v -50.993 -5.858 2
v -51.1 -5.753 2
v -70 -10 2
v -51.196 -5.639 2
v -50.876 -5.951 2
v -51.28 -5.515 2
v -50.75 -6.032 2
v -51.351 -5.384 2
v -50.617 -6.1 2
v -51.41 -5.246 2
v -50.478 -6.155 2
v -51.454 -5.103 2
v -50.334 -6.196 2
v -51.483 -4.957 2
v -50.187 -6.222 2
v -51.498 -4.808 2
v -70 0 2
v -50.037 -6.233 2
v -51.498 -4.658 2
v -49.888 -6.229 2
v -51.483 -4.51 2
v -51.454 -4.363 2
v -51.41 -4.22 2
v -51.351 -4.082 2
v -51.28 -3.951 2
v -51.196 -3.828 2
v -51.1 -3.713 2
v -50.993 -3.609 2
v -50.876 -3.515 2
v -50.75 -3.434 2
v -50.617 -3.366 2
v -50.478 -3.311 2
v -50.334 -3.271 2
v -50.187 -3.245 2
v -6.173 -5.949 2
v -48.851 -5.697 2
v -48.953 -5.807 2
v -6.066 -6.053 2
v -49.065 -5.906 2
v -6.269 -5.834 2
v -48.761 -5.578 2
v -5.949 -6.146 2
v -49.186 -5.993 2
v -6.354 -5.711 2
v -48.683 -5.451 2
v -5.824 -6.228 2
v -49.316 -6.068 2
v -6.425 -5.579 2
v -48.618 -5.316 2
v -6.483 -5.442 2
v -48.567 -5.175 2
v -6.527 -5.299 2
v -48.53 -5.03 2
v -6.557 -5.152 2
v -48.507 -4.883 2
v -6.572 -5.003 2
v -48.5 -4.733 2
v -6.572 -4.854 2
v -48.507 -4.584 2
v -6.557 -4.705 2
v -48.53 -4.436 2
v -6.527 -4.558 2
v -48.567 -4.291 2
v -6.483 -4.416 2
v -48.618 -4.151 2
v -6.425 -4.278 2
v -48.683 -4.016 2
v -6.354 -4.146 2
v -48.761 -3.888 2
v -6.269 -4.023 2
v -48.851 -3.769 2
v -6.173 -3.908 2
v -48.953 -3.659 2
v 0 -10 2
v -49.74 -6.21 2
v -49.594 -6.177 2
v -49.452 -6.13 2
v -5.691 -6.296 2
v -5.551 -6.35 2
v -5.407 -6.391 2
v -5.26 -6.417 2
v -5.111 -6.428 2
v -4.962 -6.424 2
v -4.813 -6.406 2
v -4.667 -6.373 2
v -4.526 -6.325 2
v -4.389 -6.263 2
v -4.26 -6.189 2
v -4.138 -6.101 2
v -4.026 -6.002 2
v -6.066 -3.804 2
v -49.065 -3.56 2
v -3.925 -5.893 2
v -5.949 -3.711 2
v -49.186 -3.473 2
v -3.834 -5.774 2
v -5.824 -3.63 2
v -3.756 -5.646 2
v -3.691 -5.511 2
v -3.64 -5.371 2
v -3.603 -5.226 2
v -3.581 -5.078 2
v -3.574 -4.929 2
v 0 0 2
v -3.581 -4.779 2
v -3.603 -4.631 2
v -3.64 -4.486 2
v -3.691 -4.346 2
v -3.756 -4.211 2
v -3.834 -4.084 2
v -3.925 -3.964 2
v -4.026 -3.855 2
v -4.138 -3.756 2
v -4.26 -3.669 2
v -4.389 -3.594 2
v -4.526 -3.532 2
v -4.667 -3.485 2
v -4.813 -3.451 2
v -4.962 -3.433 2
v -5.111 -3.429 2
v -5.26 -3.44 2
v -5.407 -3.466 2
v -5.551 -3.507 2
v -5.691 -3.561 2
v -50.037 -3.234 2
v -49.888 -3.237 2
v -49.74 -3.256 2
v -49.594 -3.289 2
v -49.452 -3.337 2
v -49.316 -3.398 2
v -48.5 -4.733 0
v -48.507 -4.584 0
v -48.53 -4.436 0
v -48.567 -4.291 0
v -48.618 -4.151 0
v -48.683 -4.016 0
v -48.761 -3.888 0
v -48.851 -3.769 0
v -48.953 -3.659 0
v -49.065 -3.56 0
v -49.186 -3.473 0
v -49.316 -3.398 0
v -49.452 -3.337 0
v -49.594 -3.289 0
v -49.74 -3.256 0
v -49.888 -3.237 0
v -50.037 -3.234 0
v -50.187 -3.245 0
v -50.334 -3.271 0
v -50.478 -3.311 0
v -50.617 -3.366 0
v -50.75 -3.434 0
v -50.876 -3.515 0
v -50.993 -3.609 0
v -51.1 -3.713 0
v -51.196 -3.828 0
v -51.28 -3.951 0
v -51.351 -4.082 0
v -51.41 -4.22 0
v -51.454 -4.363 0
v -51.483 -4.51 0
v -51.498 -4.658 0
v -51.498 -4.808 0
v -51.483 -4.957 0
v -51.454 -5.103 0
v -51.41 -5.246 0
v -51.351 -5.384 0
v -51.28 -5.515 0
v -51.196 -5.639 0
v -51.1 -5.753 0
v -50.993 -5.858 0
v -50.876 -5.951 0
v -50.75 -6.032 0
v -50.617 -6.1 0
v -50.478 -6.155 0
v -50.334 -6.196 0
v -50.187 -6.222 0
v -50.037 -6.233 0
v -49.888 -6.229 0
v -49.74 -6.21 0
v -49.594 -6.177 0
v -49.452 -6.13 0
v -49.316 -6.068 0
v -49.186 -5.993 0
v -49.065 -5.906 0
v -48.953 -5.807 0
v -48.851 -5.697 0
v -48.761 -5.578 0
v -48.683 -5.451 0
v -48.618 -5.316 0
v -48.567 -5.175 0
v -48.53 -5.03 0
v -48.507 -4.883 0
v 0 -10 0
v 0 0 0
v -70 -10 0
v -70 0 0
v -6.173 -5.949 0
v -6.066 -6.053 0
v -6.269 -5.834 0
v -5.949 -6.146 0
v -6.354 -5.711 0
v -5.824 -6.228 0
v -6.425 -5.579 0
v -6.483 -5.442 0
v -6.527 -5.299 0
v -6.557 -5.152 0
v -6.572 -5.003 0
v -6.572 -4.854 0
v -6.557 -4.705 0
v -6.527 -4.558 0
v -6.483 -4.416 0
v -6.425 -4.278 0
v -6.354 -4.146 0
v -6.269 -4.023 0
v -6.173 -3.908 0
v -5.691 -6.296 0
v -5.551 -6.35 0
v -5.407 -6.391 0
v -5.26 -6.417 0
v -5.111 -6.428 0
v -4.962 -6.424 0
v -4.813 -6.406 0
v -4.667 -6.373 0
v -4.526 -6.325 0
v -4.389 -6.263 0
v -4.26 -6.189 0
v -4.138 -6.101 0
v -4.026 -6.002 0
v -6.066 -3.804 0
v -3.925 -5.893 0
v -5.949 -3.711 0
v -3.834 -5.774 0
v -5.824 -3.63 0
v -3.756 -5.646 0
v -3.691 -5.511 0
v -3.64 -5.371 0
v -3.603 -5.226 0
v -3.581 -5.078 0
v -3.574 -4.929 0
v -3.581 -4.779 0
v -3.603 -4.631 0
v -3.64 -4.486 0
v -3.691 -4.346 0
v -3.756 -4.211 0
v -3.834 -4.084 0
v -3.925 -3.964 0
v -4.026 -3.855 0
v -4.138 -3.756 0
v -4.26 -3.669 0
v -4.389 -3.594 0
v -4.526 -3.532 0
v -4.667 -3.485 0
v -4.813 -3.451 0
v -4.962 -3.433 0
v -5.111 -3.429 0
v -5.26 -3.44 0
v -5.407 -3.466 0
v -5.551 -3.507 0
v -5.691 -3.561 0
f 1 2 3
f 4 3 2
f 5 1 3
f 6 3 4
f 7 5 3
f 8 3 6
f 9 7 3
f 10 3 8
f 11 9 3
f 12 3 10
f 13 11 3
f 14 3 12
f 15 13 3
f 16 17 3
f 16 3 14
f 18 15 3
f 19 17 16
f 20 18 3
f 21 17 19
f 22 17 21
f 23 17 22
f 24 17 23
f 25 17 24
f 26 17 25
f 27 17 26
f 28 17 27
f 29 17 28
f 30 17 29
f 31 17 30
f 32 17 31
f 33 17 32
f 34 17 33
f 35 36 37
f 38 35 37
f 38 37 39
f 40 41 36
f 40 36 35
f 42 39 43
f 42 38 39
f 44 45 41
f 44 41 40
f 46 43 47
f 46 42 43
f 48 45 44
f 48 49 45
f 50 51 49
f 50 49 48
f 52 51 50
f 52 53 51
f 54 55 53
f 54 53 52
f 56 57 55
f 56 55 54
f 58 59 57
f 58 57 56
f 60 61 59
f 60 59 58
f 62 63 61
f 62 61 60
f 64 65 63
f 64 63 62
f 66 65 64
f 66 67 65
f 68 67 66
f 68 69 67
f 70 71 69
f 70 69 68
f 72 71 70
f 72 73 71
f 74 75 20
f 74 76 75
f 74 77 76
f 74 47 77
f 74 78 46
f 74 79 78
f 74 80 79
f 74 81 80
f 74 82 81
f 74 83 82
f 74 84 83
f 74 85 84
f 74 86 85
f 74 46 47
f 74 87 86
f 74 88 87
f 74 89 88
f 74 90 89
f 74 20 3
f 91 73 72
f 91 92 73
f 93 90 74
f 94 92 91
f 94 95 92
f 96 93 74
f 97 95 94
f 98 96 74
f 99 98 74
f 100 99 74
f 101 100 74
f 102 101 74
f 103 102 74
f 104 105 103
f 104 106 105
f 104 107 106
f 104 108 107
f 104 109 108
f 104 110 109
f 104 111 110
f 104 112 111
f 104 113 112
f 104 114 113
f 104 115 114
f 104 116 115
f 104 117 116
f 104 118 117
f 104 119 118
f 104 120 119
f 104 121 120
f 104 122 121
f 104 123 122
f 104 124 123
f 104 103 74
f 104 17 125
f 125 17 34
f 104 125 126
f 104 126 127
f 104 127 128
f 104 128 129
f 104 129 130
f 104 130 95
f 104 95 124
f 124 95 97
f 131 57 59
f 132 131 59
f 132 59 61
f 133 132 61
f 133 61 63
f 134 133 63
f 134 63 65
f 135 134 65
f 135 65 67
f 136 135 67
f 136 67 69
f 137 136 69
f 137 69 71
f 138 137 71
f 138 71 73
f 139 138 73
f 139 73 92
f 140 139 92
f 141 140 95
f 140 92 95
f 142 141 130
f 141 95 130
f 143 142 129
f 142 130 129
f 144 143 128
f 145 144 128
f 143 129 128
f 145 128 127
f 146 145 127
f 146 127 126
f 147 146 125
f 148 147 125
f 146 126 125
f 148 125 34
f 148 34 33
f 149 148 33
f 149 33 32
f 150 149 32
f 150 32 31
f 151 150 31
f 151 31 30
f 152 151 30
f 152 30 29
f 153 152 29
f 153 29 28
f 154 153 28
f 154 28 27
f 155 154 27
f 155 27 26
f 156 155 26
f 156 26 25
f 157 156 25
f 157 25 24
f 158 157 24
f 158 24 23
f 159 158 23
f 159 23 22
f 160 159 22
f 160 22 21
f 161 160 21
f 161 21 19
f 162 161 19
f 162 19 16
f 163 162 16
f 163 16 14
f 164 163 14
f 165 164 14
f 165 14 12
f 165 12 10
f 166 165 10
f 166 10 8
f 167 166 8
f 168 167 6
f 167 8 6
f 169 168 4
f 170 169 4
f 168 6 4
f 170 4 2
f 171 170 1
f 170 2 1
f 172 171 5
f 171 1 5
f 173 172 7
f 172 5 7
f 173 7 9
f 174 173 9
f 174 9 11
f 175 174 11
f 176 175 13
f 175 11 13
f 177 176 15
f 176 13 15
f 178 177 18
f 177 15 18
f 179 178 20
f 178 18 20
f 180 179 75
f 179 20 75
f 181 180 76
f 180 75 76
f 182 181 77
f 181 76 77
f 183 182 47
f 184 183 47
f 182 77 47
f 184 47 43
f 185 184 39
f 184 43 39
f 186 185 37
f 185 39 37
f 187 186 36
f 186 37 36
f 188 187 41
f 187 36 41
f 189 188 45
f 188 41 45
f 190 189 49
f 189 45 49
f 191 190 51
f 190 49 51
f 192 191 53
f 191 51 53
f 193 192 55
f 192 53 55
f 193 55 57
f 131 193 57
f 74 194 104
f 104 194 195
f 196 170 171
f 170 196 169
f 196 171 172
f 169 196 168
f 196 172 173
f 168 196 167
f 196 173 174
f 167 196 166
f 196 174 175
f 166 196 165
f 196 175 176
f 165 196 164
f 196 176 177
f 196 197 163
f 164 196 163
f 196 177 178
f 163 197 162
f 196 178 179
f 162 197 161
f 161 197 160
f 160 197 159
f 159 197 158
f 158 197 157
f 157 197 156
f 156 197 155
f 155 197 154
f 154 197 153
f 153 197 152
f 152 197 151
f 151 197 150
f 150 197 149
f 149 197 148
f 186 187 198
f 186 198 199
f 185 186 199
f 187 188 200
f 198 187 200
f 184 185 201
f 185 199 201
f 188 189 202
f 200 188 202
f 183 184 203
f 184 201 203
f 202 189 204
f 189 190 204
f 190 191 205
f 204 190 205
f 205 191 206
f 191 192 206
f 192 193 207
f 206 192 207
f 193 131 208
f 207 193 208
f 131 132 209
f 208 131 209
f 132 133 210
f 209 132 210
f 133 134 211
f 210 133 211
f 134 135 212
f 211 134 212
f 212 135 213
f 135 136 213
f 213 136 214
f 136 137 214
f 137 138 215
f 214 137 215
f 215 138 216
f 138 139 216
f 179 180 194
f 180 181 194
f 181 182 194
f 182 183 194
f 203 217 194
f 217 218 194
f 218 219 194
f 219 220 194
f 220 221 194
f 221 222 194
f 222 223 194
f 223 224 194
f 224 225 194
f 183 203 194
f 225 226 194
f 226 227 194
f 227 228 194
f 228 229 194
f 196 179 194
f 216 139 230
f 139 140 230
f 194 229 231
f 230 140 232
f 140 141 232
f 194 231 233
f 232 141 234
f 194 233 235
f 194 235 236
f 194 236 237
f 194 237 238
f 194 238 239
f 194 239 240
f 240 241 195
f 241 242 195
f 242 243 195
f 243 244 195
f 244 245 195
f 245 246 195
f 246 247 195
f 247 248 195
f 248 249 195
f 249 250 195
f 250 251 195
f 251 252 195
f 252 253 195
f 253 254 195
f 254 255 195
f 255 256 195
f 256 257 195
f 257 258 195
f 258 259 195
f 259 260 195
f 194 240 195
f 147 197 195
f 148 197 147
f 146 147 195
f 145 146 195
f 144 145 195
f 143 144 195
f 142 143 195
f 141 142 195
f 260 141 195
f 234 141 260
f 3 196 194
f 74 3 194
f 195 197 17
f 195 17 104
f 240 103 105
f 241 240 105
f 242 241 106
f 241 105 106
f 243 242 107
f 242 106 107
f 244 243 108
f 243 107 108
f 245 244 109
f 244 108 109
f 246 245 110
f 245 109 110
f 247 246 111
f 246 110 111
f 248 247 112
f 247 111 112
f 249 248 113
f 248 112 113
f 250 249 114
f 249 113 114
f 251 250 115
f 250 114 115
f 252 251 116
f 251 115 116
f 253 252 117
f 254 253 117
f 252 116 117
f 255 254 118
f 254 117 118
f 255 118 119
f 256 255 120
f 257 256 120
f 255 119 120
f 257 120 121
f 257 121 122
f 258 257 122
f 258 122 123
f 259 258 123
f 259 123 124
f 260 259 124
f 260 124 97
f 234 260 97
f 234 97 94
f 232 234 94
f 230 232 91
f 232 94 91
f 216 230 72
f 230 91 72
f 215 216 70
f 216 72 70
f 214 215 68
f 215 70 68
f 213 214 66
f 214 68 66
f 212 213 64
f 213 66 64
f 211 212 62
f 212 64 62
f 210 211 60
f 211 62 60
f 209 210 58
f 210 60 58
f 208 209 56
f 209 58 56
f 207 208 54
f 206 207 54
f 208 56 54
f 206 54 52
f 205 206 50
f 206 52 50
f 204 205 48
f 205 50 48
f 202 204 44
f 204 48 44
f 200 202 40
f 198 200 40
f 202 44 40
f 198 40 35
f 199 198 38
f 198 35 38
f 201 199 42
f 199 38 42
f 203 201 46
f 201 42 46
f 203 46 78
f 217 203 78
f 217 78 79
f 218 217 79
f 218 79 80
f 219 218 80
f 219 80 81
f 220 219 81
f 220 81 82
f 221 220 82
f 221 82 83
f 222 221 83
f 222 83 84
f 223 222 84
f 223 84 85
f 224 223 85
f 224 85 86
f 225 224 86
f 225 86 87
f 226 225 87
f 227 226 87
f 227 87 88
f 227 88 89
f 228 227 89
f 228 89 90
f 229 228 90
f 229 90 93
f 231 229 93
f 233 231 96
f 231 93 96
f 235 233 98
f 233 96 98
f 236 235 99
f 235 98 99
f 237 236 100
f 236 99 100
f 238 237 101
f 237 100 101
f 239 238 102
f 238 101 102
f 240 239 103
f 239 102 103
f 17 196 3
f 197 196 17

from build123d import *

# Parameters (mm, degrees)
SKETCH1_W           = 70
SKETCH1_H           = 10
BOSS_EXTRUDE1_DEPTH = 2
SKETCH2_R           = 1.5
CUT_EXTRUDE1_DEPTH  = 2
SKETCH3_R           = 1.5
CUT_EXTRUDE2_DEPTH  = 10


with BuildPart() as part:
    # Sketch1 → Boss-Extrude1 (new body)
    with BuildSketch(Plane.XY):
        with Locations((-35, -5)):
            Rectangle(SKETCH1_W, SKETCH1_H)
    extrude(amount=BOSS_EXTRUDE1_DEPTH)

    # Sketch2 → Cut-Extrude1 (cut)
    with BuildSketch(Plane.XY.offset(2)):
        with Locations((-5.07364211, -4.928592782)):
            Circle(SKETCH2_R)
    extrude(amount=-CUT_EXTRUDE1_DEPTH, mode=Mode.SUBTRACT)

    # Sketch3 → Cut-Extrude2 (cut)
    with BuildSketch(Plane.XY.offset(2)):
        with Locations((-50, -4.733233439)):
            Circle(SKETCH3_R)
    extrude(amount=-CUT_EXTRUDE2_DEPTH, mode=Mode.SUBTRACT)


solid = part.part
